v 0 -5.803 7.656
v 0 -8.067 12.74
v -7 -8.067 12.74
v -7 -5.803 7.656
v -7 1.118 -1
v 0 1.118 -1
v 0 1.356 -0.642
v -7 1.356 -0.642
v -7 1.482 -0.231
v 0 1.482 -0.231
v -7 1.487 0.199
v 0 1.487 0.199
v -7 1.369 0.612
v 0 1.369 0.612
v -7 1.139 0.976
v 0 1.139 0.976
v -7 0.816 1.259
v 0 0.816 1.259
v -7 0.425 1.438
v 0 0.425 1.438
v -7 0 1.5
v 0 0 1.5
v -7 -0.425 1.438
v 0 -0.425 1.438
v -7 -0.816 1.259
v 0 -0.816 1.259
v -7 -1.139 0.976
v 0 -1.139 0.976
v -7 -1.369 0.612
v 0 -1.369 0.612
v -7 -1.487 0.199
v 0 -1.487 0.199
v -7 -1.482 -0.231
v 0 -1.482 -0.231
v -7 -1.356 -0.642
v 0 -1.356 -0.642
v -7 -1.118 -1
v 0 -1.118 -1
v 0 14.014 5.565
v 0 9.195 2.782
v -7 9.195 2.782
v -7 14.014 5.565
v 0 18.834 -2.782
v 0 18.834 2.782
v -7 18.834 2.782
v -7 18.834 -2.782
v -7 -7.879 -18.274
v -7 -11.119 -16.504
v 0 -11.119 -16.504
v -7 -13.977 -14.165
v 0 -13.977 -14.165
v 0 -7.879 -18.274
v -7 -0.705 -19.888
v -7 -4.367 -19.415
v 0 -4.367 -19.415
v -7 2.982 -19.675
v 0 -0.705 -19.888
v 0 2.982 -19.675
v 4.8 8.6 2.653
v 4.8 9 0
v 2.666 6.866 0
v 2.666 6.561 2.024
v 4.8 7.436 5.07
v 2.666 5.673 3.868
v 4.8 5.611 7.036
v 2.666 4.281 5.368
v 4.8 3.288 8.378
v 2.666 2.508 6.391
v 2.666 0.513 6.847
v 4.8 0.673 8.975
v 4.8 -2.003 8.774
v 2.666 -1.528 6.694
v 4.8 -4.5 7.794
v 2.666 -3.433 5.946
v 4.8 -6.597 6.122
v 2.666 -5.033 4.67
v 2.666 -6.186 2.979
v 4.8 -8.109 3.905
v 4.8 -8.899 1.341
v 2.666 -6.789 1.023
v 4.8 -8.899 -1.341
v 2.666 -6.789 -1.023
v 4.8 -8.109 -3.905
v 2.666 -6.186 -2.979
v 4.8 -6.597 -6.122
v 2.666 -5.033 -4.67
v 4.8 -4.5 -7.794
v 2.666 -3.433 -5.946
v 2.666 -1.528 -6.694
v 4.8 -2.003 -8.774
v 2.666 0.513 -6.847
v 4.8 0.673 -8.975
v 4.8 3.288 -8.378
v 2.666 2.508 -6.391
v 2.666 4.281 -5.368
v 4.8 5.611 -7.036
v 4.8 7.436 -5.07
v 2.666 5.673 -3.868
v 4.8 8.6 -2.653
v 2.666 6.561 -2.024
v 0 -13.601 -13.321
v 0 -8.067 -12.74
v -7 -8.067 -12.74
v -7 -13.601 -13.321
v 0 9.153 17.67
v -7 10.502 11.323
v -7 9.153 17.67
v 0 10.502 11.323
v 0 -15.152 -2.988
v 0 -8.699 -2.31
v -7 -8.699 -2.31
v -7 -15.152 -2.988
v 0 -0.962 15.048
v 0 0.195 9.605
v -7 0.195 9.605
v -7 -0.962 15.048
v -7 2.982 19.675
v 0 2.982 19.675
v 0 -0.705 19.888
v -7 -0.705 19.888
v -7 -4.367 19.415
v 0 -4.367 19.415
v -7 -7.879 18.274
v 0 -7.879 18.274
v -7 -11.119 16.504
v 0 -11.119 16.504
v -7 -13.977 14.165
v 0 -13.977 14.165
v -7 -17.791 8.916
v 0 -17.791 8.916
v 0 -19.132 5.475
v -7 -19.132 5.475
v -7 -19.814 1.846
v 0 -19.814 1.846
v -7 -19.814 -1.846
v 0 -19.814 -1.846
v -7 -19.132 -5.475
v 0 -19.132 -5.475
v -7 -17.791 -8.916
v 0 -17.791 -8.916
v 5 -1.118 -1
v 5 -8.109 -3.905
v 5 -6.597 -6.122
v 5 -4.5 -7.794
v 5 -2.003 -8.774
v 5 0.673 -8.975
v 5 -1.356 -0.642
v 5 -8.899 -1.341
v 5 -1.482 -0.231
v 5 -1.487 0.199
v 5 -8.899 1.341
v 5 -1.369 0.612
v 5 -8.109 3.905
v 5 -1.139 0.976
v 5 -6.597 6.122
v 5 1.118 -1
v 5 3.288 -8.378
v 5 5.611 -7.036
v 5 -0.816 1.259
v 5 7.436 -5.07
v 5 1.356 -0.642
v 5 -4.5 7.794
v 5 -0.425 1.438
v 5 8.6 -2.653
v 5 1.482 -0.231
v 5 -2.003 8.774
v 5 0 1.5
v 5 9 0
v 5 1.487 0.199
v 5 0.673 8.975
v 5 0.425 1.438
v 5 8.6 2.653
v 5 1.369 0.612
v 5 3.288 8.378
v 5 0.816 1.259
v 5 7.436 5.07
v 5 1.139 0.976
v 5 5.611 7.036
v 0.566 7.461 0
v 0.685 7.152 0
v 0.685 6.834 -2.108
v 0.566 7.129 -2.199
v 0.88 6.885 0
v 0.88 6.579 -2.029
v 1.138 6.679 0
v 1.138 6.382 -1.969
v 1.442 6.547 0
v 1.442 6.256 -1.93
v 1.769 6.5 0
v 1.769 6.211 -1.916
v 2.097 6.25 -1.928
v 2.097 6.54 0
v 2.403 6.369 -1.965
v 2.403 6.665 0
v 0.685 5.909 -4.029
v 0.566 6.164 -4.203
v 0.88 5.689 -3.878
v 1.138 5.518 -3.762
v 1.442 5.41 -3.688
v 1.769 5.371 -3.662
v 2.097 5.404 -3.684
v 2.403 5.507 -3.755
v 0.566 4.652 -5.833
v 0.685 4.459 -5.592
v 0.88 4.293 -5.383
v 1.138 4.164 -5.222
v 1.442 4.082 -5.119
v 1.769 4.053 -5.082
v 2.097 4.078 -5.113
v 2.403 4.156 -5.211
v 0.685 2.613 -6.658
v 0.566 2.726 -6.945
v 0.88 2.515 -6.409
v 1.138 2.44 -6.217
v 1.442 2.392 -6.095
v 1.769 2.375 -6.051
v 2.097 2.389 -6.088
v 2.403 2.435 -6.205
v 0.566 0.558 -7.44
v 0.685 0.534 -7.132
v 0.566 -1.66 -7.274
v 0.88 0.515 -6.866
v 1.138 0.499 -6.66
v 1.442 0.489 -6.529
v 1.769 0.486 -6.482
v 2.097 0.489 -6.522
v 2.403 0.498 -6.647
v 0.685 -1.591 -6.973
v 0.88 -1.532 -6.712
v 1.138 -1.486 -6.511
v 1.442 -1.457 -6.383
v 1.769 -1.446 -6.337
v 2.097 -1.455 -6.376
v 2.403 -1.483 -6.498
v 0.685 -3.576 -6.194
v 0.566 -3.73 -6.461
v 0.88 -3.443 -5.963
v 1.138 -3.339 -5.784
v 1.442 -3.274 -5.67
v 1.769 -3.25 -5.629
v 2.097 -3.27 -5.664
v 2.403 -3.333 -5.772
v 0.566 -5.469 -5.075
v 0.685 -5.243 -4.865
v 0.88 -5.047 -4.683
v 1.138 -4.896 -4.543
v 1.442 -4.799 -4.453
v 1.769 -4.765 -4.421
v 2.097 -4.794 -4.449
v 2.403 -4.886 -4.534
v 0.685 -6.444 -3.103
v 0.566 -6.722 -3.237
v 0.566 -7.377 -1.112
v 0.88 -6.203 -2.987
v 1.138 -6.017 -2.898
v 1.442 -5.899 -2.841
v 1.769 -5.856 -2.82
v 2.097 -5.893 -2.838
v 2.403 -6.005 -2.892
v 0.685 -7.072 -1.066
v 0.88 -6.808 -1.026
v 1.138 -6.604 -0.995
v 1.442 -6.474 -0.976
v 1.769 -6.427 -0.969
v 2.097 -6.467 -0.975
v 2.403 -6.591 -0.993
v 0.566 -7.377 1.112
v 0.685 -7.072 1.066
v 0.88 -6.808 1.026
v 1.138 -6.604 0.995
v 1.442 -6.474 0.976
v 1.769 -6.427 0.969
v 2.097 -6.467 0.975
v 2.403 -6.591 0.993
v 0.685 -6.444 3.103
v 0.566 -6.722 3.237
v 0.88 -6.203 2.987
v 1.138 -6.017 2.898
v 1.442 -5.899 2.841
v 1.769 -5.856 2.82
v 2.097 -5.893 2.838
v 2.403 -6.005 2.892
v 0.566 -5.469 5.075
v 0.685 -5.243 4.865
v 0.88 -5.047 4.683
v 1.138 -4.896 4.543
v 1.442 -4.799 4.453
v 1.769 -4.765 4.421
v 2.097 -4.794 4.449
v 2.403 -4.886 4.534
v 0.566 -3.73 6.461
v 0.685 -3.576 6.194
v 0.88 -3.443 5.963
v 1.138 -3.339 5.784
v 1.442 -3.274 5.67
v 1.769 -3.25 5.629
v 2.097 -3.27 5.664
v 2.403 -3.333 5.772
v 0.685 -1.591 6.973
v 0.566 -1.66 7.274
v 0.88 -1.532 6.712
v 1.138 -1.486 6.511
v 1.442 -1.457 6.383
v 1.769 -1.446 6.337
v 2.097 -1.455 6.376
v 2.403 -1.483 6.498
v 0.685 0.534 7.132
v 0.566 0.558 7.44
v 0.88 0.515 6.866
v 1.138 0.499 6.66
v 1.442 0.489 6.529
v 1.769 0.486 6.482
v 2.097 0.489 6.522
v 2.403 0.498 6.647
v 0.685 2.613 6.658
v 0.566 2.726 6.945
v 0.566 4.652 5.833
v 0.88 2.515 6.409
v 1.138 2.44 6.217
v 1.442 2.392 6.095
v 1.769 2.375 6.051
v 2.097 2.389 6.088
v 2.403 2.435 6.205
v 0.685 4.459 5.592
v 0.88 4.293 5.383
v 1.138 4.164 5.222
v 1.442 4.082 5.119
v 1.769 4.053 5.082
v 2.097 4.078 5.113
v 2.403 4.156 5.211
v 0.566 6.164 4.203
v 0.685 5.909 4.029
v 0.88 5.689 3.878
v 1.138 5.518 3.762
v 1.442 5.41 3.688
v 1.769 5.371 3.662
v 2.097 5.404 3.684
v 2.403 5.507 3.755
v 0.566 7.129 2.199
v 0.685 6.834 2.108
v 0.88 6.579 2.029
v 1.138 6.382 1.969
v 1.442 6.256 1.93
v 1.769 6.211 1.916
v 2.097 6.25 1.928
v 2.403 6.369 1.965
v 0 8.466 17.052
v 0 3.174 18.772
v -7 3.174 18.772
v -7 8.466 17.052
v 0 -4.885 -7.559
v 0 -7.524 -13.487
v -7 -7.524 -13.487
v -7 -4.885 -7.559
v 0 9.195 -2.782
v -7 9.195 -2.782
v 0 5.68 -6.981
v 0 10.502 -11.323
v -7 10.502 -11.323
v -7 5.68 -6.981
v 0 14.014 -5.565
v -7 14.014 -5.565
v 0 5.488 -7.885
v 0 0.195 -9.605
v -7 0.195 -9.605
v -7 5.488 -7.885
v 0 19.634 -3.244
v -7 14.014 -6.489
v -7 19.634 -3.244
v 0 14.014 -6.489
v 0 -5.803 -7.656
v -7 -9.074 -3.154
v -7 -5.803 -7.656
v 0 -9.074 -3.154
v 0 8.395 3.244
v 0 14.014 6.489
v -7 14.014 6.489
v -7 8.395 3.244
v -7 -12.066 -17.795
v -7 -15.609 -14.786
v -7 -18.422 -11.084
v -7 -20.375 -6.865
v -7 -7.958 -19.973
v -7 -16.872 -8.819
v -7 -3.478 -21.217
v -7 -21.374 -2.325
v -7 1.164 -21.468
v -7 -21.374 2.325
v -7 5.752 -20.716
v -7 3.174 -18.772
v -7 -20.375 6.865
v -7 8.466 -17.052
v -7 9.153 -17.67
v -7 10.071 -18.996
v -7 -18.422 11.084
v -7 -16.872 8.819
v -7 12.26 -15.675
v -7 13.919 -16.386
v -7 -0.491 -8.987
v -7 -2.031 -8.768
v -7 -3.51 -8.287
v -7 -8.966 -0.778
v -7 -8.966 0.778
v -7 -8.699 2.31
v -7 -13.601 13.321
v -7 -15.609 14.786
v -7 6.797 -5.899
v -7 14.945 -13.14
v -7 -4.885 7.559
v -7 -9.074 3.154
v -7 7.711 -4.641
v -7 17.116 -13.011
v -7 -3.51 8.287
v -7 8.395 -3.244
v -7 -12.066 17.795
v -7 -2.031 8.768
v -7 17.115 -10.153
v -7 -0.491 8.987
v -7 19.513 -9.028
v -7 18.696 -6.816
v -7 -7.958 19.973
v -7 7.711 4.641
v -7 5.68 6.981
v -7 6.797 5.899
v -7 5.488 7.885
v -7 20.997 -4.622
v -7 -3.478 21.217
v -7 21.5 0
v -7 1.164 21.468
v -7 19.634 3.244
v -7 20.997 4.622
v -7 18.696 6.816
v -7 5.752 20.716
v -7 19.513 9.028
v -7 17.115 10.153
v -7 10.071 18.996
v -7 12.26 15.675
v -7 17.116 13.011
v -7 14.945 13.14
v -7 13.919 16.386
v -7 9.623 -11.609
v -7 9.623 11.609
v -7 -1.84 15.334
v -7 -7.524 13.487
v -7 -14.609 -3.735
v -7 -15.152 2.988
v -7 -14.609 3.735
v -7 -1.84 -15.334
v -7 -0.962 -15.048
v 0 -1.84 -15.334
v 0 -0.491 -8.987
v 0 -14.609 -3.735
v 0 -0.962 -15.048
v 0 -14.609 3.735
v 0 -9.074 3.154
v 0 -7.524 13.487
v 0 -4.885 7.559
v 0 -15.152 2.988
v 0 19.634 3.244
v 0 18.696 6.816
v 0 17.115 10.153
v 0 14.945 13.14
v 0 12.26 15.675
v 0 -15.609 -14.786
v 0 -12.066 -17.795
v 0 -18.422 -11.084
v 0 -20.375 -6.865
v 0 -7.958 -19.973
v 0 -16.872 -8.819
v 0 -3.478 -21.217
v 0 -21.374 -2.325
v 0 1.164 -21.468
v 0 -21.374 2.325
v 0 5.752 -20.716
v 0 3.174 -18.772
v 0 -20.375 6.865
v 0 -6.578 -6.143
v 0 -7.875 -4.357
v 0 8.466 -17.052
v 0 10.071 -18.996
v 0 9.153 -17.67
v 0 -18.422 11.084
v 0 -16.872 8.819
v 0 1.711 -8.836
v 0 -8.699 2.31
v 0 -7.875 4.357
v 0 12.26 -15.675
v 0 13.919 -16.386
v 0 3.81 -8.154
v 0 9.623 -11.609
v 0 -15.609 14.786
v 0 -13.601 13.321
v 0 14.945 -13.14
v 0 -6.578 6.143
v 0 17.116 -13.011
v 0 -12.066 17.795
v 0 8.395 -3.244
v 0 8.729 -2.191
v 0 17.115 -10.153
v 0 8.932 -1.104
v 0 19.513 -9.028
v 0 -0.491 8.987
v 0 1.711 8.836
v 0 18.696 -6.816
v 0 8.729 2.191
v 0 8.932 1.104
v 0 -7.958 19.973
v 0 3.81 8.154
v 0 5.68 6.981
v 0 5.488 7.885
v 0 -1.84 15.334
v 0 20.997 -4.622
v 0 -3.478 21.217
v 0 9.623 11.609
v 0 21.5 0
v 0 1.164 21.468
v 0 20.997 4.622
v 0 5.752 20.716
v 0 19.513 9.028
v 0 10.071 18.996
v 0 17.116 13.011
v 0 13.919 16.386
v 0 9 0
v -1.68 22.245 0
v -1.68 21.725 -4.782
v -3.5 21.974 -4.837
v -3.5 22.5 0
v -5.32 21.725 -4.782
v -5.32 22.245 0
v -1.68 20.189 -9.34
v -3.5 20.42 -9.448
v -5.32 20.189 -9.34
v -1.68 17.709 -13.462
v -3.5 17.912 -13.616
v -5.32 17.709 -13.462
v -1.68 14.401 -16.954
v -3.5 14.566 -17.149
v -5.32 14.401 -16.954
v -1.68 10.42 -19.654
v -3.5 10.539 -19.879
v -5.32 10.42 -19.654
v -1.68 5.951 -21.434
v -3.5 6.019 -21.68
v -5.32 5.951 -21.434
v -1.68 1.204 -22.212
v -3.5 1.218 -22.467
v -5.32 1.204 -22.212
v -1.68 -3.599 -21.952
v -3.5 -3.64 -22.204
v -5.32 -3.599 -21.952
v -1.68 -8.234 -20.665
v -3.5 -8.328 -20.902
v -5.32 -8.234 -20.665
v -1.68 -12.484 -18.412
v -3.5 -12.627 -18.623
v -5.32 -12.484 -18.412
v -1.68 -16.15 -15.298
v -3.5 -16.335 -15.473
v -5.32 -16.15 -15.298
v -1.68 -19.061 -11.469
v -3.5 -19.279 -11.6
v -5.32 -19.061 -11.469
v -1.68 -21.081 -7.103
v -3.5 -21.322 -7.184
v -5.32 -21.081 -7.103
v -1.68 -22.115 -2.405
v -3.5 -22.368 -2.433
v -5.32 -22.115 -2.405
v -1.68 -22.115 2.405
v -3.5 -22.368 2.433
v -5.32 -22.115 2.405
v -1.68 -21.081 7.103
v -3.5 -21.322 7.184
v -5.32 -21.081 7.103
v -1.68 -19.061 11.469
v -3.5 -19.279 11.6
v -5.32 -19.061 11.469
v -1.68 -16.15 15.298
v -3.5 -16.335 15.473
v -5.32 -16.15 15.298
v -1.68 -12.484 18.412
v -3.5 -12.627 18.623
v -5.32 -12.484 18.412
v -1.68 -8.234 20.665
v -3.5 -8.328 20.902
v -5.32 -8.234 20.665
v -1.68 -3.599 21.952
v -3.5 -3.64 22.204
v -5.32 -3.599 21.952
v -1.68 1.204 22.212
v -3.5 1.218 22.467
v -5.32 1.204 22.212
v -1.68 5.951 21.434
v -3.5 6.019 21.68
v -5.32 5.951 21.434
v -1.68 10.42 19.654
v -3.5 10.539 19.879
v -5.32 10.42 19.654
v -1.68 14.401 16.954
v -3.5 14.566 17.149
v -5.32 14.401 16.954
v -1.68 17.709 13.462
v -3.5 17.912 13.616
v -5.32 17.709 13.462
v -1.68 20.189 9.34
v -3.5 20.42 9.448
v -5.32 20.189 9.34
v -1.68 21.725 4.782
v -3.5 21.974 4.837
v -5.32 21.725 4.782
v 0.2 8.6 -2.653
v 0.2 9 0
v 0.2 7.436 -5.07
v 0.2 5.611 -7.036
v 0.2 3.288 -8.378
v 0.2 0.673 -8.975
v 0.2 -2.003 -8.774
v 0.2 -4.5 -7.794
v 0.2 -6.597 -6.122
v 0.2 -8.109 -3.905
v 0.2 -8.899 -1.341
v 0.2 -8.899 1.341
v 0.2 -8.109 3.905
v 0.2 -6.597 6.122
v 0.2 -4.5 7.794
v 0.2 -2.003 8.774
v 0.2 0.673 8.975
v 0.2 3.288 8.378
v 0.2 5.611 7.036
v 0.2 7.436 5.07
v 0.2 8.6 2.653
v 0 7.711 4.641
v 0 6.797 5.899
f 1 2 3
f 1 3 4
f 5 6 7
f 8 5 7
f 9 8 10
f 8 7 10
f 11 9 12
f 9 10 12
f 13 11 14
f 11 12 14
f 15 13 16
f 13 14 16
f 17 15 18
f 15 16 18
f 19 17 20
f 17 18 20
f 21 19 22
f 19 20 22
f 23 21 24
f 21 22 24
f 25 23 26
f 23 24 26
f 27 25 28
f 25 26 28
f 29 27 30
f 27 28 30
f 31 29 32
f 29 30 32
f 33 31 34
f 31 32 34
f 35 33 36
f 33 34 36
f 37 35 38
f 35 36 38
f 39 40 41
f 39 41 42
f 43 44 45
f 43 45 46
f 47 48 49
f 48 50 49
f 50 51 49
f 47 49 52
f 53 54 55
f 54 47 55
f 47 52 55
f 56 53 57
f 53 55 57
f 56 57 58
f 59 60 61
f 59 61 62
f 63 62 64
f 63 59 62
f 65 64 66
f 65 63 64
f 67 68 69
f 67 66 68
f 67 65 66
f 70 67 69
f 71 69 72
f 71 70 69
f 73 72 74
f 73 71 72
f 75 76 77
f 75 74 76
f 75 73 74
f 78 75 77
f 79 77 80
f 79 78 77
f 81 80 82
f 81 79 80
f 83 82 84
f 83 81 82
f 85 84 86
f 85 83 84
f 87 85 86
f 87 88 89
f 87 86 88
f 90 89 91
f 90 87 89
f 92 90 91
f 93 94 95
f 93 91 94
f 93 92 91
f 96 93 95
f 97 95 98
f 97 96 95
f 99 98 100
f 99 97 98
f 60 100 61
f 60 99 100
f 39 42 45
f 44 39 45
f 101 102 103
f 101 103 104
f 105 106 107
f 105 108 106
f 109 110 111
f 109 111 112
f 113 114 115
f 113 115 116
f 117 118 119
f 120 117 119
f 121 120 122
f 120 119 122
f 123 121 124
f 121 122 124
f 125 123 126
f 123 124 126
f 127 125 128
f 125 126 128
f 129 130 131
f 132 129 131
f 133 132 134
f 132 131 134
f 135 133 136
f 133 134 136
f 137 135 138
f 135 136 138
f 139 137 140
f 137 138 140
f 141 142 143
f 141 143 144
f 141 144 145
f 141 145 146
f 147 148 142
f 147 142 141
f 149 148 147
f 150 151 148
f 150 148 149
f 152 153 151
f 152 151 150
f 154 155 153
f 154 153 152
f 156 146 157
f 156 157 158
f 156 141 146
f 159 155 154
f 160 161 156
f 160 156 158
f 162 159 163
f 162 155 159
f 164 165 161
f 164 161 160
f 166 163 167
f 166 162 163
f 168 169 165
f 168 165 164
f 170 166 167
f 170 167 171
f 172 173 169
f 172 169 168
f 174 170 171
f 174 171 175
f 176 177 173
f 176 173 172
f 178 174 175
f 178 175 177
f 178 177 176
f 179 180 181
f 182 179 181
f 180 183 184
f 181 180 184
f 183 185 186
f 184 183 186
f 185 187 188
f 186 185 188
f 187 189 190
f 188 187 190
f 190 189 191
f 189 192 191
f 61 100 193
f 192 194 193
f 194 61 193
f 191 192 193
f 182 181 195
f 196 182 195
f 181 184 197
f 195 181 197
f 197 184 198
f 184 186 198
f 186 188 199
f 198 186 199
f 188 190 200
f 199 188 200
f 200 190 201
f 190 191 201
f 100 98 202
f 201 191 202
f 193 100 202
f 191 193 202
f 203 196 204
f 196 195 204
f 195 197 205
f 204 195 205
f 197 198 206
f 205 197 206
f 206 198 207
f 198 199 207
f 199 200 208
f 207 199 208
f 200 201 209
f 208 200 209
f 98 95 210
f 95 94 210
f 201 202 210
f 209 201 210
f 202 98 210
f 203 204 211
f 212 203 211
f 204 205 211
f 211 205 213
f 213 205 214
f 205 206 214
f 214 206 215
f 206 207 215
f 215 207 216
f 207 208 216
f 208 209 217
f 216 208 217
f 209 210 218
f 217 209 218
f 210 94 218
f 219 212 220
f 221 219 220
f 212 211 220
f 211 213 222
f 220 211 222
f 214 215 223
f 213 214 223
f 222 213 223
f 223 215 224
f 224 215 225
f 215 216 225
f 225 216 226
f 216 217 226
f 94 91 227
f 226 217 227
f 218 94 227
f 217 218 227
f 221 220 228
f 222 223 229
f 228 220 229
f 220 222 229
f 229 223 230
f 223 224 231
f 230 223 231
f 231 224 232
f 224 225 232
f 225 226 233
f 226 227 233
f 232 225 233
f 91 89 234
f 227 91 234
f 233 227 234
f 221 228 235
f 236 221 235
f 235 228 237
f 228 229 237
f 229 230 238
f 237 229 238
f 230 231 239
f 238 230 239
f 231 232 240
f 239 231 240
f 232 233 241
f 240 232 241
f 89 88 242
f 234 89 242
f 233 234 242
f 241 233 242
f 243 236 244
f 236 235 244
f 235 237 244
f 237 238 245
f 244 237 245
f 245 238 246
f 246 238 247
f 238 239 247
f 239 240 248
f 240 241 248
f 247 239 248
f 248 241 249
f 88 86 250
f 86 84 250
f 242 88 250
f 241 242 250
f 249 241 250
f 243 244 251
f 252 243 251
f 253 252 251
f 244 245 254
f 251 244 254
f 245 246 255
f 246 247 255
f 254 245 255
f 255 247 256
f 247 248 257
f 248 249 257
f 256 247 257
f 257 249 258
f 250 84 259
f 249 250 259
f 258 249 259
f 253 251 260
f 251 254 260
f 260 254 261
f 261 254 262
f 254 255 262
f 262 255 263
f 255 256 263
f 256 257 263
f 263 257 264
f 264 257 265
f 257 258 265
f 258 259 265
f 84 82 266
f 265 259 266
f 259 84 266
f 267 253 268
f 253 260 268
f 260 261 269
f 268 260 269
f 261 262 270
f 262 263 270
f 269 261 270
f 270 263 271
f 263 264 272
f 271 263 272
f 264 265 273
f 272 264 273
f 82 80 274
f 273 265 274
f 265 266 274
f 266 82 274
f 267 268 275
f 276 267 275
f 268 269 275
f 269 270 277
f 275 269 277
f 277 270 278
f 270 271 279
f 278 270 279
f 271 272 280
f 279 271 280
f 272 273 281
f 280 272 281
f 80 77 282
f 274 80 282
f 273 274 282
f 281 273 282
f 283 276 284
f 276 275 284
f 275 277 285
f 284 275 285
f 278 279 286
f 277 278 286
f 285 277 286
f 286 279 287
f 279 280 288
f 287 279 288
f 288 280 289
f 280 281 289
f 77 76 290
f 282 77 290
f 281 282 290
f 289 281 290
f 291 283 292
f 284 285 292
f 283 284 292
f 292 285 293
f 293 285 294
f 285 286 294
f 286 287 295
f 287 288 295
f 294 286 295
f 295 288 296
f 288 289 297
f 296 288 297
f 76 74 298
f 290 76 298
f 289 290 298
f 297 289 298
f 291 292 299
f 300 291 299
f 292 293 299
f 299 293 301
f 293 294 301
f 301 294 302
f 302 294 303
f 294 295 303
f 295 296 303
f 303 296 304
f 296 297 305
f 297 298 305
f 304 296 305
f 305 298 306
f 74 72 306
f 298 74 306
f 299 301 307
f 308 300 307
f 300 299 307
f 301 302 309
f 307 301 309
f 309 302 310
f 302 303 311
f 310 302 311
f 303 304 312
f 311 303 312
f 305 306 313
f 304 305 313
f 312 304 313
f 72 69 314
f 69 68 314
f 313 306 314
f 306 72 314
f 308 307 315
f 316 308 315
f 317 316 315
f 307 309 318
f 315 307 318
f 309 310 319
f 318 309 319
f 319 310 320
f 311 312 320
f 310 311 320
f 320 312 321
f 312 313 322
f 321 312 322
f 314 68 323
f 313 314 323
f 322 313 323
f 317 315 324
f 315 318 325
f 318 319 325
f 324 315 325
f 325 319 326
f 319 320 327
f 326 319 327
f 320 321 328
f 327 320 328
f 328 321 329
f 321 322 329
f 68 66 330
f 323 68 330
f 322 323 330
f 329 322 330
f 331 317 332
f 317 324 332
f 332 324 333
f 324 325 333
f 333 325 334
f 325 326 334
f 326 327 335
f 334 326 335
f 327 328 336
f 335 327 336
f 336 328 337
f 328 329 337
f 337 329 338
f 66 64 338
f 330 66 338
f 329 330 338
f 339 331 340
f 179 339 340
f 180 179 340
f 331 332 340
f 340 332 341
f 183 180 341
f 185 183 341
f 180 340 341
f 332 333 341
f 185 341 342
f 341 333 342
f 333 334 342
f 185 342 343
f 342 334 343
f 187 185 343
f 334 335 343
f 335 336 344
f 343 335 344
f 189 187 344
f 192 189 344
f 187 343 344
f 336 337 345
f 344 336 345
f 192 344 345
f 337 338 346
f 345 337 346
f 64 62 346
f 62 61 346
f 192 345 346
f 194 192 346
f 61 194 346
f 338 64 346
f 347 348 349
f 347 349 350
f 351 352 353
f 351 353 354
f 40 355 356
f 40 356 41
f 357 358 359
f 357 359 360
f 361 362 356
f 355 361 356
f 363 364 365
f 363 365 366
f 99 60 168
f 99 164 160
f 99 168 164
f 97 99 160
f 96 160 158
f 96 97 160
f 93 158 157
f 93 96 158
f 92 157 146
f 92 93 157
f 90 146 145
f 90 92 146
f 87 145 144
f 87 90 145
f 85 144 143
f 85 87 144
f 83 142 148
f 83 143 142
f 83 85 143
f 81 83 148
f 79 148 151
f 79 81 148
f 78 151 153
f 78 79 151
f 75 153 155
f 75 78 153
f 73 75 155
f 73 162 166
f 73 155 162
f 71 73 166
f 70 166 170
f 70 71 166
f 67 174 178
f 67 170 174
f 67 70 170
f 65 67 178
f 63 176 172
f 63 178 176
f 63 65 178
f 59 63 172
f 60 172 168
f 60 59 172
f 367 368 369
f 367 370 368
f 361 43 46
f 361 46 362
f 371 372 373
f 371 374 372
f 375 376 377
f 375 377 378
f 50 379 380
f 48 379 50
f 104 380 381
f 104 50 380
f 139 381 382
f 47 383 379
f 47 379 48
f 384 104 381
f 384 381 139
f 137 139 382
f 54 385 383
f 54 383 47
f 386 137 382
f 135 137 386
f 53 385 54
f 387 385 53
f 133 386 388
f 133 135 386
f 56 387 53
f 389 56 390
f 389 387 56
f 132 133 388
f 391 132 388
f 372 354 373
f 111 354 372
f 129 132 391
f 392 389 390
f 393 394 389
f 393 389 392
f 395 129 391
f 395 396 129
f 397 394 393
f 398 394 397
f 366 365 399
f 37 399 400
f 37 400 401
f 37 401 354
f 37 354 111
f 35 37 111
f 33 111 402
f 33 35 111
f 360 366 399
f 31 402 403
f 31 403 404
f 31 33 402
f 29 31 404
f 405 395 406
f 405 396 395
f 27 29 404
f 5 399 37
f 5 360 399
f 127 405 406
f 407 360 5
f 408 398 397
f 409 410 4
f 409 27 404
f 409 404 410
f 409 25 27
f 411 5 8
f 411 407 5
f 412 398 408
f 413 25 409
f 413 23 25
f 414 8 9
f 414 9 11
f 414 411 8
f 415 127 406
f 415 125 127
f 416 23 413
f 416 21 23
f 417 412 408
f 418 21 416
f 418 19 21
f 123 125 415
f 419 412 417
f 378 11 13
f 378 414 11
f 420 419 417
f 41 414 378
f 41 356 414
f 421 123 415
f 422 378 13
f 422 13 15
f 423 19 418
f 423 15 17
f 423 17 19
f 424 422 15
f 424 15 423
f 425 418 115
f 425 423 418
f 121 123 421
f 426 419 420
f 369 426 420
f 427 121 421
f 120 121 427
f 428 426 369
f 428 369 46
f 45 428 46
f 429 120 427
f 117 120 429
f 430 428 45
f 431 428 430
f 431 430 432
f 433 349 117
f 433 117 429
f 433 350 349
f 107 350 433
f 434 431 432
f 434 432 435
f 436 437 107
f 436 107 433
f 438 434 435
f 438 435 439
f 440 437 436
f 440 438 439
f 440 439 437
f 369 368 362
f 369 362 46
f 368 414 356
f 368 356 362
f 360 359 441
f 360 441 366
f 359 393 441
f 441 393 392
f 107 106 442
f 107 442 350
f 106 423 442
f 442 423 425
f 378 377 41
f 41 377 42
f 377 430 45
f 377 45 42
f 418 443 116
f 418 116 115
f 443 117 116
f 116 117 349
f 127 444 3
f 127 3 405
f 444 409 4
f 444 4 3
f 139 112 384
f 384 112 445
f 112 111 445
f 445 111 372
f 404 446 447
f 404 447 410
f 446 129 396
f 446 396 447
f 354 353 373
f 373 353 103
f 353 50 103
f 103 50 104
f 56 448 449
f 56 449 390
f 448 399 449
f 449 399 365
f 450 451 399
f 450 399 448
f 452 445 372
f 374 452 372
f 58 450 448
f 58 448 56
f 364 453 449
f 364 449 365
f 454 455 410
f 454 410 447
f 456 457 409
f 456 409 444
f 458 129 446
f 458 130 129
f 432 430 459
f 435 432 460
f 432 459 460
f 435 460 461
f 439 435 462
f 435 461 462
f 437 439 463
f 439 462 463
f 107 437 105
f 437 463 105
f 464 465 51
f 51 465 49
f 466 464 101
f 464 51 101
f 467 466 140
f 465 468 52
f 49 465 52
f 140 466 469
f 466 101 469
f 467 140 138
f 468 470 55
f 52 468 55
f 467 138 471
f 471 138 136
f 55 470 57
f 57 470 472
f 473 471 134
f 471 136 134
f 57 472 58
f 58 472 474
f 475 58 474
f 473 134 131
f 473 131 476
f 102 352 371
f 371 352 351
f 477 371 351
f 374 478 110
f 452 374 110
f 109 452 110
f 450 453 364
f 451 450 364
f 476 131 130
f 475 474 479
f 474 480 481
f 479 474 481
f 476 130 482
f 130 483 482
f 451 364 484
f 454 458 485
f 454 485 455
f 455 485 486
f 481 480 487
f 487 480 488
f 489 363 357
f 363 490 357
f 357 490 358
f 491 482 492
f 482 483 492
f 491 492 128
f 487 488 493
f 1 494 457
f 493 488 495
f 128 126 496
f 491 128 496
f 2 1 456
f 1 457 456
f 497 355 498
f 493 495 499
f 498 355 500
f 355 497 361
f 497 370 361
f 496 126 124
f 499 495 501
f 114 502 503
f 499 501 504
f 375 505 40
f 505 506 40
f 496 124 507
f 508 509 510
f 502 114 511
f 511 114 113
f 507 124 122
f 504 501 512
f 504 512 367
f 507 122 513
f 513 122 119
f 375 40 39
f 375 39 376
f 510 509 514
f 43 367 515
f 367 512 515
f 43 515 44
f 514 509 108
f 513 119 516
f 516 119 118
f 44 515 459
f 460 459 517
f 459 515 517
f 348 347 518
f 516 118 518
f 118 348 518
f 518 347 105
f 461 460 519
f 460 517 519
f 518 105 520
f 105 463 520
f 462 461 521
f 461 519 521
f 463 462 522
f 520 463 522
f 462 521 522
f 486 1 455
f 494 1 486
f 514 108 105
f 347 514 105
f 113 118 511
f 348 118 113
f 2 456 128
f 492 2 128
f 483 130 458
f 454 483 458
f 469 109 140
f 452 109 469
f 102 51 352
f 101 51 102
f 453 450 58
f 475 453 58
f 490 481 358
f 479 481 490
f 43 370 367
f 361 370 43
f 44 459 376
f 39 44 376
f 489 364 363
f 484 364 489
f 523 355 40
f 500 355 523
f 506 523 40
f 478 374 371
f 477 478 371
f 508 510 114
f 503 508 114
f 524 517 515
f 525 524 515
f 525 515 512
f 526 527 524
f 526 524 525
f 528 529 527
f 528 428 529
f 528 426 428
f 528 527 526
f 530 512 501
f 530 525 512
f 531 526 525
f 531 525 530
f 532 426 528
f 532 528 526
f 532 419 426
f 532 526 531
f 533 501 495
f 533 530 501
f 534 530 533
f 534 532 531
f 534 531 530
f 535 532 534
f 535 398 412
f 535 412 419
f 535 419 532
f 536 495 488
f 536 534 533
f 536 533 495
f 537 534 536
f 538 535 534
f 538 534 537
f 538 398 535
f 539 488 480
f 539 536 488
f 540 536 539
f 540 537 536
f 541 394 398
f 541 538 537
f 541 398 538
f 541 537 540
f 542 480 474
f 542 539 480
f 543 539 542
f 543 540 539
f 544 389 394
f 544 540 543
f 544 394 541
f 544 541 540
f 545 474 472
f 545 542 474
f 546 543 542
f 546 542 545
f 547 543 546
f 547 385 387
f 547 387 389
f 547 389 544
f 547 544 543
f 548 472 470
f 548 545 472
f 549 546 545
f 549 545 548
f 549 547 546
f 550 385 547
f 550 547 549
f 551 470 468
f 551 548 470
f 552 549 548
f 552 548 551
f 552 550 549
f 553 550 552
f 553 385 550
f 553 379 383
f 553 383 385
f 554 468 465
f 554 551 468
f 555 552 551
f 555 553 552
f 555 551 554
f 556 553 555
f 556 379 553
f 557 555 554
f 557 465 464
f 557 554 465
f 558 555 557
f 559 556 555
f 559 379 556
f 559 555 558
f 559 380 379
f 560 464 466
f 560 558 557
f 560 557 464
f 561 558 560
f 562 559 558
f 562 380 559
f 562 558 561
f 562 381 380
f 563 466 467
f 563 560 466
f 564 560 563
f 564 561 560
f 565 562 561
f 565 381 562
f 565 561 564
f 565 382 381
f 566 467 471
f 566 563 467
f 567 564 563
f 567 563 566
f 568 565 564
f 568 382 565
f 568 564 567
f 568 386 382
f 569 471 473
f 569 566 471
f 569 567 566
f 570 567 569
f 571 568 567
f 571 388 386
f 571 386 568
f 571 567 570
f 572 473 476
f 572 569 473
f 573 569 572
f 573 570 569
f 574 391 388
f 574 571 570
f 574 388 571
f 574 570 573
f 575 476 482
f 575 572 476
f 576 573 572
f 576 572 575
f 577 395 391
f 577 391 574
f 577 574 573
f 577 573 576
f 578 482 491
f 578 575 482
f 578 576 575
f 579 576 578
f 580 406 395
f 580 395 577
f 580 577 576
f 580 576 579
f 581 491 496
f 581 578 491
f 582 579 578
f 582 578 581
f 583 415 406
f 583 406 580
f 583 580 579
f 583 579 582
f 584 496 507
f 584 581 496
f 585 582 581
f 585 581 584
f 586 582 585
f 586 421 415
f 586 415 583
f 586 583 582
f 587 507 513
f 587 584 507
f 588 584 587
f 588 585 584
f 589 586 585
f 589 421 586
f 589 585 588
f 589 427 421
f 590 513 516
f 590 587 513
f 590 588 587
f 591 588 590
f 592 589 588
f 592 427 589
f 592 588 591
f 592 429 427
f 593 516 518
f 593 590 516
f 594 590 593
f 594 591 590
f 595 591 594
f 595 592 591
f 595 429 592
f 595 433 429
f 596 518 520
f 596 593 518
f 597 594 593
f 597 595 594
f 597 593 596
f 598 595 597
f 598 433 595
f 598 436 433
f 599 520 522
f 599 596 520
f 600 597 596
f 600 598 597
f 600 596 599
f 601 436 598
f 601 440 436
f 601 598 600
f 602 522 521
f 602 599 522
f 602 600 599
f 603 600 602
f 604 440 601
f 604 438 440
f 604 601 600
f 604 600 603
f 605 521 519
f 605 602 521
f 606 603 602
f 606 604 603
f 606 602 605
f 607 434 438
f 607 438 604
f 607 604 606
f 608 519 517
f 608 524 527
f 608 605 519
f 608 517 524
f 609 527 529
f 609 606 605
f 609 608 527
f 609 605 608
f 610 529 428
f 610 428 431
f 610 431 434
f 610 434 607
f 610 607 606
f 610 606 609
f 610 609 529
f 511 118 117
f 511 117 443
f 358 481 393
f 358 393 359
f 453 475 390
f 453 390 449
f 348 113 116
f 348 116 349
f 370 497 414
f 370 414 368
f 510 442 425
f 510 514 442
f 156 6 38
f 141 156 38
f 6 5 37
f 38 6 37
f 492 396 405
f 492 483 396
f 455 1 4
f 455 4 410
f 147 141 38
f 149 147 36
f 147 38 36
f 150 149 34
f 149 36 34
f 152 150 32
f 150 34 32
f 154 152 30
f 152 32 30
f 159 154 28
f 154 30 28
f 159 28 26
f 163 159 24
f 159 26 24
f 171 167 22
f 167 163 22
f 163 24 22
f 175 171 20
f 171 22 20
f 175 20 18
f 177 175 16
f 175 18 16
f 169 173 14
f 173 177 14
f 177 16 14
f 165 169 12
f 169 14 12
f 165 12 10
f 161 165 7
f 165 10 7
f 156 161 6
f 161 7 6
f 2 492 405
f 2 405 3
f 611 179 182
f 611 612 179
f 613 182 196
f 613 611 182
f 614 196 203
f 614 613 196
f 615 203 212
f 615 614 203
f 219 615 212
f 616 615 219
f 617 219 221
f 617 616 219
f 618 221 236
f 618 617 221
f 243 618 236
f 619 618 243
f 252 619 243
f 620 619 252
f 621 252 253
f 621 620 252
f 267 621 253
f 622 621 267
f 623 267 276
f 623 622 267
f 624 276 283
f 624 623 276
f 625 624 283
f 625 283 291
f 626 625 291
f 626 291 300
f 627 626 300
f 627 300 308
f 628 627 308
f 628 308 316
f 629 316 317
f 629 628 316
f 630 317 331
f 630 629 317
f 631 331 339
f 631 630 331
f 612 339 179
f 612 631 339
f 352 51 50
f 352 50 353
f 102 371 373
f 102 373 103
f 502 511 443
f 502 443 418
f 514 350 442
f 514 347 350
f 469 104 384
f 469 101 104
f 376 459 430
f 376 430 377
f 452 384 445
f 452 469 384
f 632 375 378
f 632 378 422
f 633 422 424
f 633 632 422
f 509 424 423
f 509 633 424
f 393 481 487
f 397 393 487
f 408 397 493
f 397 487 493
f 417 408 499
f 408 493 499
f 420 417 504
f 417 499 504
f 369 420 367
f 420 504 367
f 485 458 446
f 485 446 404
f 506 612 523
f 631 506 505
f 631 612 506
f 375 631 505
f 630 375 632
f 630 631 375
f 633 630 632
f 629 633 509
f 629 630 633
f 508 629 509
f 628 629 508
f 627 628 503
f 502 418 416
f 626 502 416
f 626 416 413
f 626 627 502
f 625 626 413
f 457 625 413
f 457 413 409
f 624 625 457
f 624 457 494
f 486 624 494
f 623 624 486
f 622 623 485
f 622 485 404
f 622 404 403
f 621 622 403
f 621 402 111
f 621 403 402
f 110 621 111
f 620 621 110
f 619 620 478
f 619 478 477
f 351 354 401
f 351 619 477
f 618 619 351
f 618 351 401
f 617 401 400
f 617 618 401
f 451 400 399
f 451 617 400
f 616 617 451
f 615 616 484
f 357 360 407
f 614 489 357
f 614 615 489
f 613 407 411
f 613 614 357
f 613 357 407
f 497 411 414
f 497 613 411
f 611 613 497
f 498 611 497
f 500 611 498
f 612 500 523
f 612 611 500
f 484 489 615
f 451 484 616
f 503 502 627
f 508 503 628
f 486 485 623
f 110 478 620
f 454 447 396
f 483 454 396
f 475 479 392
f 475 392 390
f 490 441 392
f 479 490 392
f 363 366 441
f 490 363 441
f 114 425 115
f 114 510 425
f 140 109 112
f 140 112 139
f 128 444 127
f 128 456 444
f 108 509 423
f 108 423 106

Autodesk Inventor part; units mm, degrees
ref_plane "YZ Plane" through (0, 0, 0) normal (1, 0, 0) x (0, 1, 0)
ref_plane "XZ Plane" through (0, 0, 0) normal (0, 1, 0) x (-1, 0, 0)
ref_plane "XY Plane" through (0, 0, 0) normal (0, 0, 1) x (1, 0, 0)
sketch "Sketch1" plane through (0, 0, 0) normal (1, 0, 0) x (0, 1, 0)
  circle A0 centre (0, 0) radius 1.5
  line L0 (-30.1, 0) -> (30.1, 0) projected
  line L1 (1.118, -1) -> (-1.118, -1)
  circle A1 centre (0, 0) radius 9
  circle A2 centre (0, 0) radius 21.5
  circle A3 centre (0, 0) radius 18.5
  dimension "d0" = 3
  dimension "d1" = 1
  dimension "d3" = 43
  dimension "d4" = 3
  dimension "d6" = 18
extrude "Extrusion1" add sketch "Sketch1" along normal blind 5 contours L1 A0 | A0 L0 A1 | L0 A1 A0
sketch "Sketch3" plane through (0, 0, 0) normal (0, 0, 1) x (1, 0, 0)
  line L0 (0, 9) -> (5, 9) projected
  line L1 (-1, 0) -> (6, 0) projected
  circle A0 centre (1.7822, 7.75) radius 1.25
  line L2 (0.5662, 7.4607) -> (0.2, 9)
  line L3 (0, 9) -> (5, 9) projected
  line L4 (0, 10) -> (5, 10) projected
  line L5 (0, 9) -> (5, 9) projected
  line L6 (4.8, 9) -> (2.6661, 6.8661)
  line L7 (4.8, 9) -> (4.8, 9)
  line L8 (4.8, 9) -> (5, 9)
  line L9 (5, -9) -> (5, 9) projected
  line L10 (5, 9) -> (5, 9)
  line L11 (0, -9) -> (0, 9) projected
  line L12 (0.2, 9) -> (0, 9)
  point P0 (0, 0)
  point P1 (1.7822, 9)
  point P2 (4.8, 9)
  dimension "d20" = 2.5
  dimension "d26" = 45
  dimension "d28" = 0.2
revolve "Revolution1" cut sketch "Sketch3" angle 360 about axis through (-10, 0, 0) along (-1, 0, 0) contours L0 A0 L2 | L0 L6 A0 | A0
sketch "Sketch2" plane through (0, 0, 0) normal (-1, 0, 0) x (0, 0, 1)
  circle A0 centre (0, 0) radius 21.5
  circle A1 centre (0, 0) radius 19.9
  circle A2 centre (0, 0) radius 9 projected
  line L0 (-1, 1.118) -> (-1, -1.118) projected
  arc A3 (-1, -1.118) -> (-1, 1.118) centre (0, 0) ccw projected
  line L1 (3.2444, 19.6337) -> (6.4888, 14.0143)
  line L2 (6.4888, 14.0143) -> (3.2444, 8.3949)
  line L3 (3.2444, 8.3949) -> (-3.2444, 8.3949)
  line L4 (-3.2444, 8.3949) -> (-6.4888, 14.0143)
  line L5 (-6.4888, 14.0143) -> (-3.2444, 19.6337)
  line L6 (-3.2444, 19.6337) -> (3.2444, 19.6337)
  line L7 (0, -30.1) -> (0, 30.1) projected
  line L8 (-2.7825, 18.8337) -> (-5.565, 14.0143)
  line L9 (-5.565, 14.0143) -> (-2.7825, 9.1949)
  line L10 (-2.7825, 9.1949) -> (2.7825, 9.1949)
  line L11 (2.7825, 9.1949) -> (5.565, 14.0143)
  line L12 (5.565, 14.0143) -> (2.7825, 18.8337)
  line L13 (2.7825, 18.8337) -> (-2.7825, 18.8337)
  line L14 (-17.6702, 9.1528) -> (-11.3233, 10.5018)
  line L15 (-19.6754, 2.9816) -> (-17.6702, 9.1528)
  line L16 (-15.3335, -1.8405) -> (-19.6754, 2.9816)
  line L17 (-8.9866, -0.4914) -> (-15.3335, -1.8405)
  line L18 (-15.0481, -0.962) -> (-9.6047, 0.1951)
  line L19 (-9.6047, 0.1951) -> (-7.885, 5.4877)
  line L20 (-7.885, 5.4877) -> (-11.6087, 9.6233)
  line L21 (-11.3233, 10.5018) -> (-6.9814, 5.6798)
  line L22 (-6.9814, 5.6798) -> (-8.9866, -0.4914)
  line L23 (-11.6087, 9.6233) -> (-17.0521, 8.4663)
  line L24 (-17.0521, 8.4663) -> (-18.7718, 3.1736)
  line L25 (-18.7718, 3.1736) -> (-15.0481, -0.962)
  line L26 (-14.1652, -13.977) -> (-13.4869, -7.5238)
  line L27 (-8.9157, -17.791) -> (-14.1652, -13.977)
  line L28 (-2.9879, -15.1518) -> (-8.9157, -17.791)
  line L29 (-2.3096, -8.6986) -> (-2.9879, -15.1518)
  line L30 (-3.7352, -14.6088) -> (-3.1535, -9.0743)
  line L31 (-3.1535, -9.0743) -> (-7.6557, -5.8033)
  line L32 (-7.6557, -5.8033) -> (-12.7396, -8.0668)
  line L33 (-13.4869, -7.5238) -> (-7.5591, -4.8846)
  line L34 (-7.5591, -4.8846) -> (-2.3096, -8.6986)
  line L35 (-12.7396, -8.0668) -> (-13.3213, -13.6013)
  line L36 (-13.3213, -13.6013) -> (-8.8191, -16.8723)
  line L37 (-8.8191, -16.8723) -> (-3.7352, -14.6088)
  line L38 (8.9157, -17.791) -> (2.9879, -15.1518)
  line L39 (14.1652, -13.977) -> (8.9157, -17.791)
  line L40 (13.4869, -7.5238) -> (14.1652, -13.977)
  line L41 (7.5591, -4.8846) -> (13.4869, -7.5238)
  line L42 (12.7396, -8.0668) -> (7.6557, -5.8033)
  line L43 (7.6557, -5.8033) -> (3.1535, -9.0743)
  line L44 (3.1535, -9.0743) -> (3.7352, -14.6088)
  line L45 (2.9879, -15.1518) -> (2.3096, -8.6986)
  line L46 (2.3096, -8.6986) -> (7.5591, -4.8846)
  line L47 (3.7352, -14.6088) -> (8.8191, -16.8723)
  line L48 (8.8191, -16.8723) -> (13.3213, -13.6013)
  line L49 (13.3213, -13.6013) -> (12.7396, -8.0668)
  line L50 (19.6754, 2.9816) -> (15.3335, -1.8405)
  line L51 (17.6702, 9.1528) -> (19.6754, 2.9816)
  line L52 (11.3233, 10.5018) -> (17.6702, 9.1528)
  line L53 (6.9814, 5.6798) -> (11.3233, 10.5018)
  line L54 (11.6087, 9.6233) -> (7.885, 5.4877)
  line L55 (7.885, 5.4877) -> (9.6047, 0.1951)
  line L56 (9.6047, 0.1951) -> (15.0481, -0.962)
  line L57 (15.3335, -1.8405) -> (8.9866, -0.4914)
  line L58 (8.9866, -0.4914) -> (6.9814, 5.6798)
  line L59 (15.0481, -0.962) -> (18.7718, 3.1736)
  line L60 (18.7718, 3.1736) -> (17.0521, 8.4663)
  line L61 (17.0521, 8.4663) -> (11.6087, 9.6233)
  point P0 (0, 14.0143)
  point P1 (3.2444, 8.3949)
  point P2 (-17.6702, 9.1528)
  point P3 (-6.9814, 5.6798)
  point P4 (-19.6754, 2.9816)
  point P5 (-8.9866, -0.4914)
  point P6 (-7.5591, -4.8846)
  point P7 (-14.1652, -13.977)
  point P8 (-8.9157, -17.791)
  point P9 (-2.3096, -8.6986)
  point P10 (2.3096, -8.6986)
  point P11 (8.9157, -17.791)
  point P12 (14.1652, -13.977)
  point P13 (7.5591, -4.8846)
  point P14 (8.9866, -0.4914)
  point P15 (19.6754, 2.9816)
  point P16 (17.6702, 9.1528)
  point P17 (6.9814, 5.6798)
  dimension "d9" = 43
  dimension "d10" = 1.6
  dimension "d11" = 0.8
  dimension "d31" = 360
extrude "Extrusion2" add sketch "Sketch2" along normal blind 7 contours A0 L7 A1 | L7 A1 A0 | L7 L6 A1 | A1 L6 L7 | L1 L2 A2 L7 L10 L11 L12 L13 L6 | L6 L7 L13 L8 L9 L10 A2 L4 L5 | A1 L27 | L27 L26 L33 A2 L29 L28 | L39 A1 | L38 L45 A2 L41 L40 L39 | L7 A3 L3 A2 L58 L46 | A2 L34 L22 L3 L7 A3 L0 | A1 L51 | L51 L50 L57 A2 L53 L52 | L15 A1 | L14 L21 A2 L17 L16 L15 | A2 L34 | L46 A2 | L3 L7 A2 | A2 L7 L3 | A2 L58 | L22 A2
sketch "Sketch4" plane through (0, 0, 0) normal (0, 0, 1) x (1, 0, 0)
  line L0 (0, 21.5) -> (-7, 21.5) projected
  line L1 (-7, 21.5) -> (-7, -21.5) projected
  arc A0 (0, 21.5) -> (-7, 21.5) centre (-3.5, 15.875) ccw
  line L2 (-8.4, 0) -> (1.4, 0) projected
  point P0 (0, 0)
  point P1 (-3.5, 22.5)
  dimension "d24" = 1
revolve "Revolution2" add sketch "Sketch4" angle 360 about axis through (-10, 0, 0) along (1, 0, 0)
equation "\"d6\" = WheelGrooveDia"
equation "\"d7\" = WheelGrooveWidth"
equation "\"d20\" = WheelPulleyDia"
equation "\"d9\" = WheelDia - 2 * Roundedness"
equation "\"d16\" = WheelWidth"
equation "\"d24\" = Roundedness"
equation "\"Roundedness\" = 1"
equation "\"WheelGrooveDia\" = 18"
equation "\"WheelGrooveWidth\" = 5"
equation "\"WheelPulleyDia\" = 2.5"
equation "\"WheelDia\" = 45"
equation "\"WheelWidth\" = 7"
properties part number "PulleyedWheelV1" material "H TPU"
